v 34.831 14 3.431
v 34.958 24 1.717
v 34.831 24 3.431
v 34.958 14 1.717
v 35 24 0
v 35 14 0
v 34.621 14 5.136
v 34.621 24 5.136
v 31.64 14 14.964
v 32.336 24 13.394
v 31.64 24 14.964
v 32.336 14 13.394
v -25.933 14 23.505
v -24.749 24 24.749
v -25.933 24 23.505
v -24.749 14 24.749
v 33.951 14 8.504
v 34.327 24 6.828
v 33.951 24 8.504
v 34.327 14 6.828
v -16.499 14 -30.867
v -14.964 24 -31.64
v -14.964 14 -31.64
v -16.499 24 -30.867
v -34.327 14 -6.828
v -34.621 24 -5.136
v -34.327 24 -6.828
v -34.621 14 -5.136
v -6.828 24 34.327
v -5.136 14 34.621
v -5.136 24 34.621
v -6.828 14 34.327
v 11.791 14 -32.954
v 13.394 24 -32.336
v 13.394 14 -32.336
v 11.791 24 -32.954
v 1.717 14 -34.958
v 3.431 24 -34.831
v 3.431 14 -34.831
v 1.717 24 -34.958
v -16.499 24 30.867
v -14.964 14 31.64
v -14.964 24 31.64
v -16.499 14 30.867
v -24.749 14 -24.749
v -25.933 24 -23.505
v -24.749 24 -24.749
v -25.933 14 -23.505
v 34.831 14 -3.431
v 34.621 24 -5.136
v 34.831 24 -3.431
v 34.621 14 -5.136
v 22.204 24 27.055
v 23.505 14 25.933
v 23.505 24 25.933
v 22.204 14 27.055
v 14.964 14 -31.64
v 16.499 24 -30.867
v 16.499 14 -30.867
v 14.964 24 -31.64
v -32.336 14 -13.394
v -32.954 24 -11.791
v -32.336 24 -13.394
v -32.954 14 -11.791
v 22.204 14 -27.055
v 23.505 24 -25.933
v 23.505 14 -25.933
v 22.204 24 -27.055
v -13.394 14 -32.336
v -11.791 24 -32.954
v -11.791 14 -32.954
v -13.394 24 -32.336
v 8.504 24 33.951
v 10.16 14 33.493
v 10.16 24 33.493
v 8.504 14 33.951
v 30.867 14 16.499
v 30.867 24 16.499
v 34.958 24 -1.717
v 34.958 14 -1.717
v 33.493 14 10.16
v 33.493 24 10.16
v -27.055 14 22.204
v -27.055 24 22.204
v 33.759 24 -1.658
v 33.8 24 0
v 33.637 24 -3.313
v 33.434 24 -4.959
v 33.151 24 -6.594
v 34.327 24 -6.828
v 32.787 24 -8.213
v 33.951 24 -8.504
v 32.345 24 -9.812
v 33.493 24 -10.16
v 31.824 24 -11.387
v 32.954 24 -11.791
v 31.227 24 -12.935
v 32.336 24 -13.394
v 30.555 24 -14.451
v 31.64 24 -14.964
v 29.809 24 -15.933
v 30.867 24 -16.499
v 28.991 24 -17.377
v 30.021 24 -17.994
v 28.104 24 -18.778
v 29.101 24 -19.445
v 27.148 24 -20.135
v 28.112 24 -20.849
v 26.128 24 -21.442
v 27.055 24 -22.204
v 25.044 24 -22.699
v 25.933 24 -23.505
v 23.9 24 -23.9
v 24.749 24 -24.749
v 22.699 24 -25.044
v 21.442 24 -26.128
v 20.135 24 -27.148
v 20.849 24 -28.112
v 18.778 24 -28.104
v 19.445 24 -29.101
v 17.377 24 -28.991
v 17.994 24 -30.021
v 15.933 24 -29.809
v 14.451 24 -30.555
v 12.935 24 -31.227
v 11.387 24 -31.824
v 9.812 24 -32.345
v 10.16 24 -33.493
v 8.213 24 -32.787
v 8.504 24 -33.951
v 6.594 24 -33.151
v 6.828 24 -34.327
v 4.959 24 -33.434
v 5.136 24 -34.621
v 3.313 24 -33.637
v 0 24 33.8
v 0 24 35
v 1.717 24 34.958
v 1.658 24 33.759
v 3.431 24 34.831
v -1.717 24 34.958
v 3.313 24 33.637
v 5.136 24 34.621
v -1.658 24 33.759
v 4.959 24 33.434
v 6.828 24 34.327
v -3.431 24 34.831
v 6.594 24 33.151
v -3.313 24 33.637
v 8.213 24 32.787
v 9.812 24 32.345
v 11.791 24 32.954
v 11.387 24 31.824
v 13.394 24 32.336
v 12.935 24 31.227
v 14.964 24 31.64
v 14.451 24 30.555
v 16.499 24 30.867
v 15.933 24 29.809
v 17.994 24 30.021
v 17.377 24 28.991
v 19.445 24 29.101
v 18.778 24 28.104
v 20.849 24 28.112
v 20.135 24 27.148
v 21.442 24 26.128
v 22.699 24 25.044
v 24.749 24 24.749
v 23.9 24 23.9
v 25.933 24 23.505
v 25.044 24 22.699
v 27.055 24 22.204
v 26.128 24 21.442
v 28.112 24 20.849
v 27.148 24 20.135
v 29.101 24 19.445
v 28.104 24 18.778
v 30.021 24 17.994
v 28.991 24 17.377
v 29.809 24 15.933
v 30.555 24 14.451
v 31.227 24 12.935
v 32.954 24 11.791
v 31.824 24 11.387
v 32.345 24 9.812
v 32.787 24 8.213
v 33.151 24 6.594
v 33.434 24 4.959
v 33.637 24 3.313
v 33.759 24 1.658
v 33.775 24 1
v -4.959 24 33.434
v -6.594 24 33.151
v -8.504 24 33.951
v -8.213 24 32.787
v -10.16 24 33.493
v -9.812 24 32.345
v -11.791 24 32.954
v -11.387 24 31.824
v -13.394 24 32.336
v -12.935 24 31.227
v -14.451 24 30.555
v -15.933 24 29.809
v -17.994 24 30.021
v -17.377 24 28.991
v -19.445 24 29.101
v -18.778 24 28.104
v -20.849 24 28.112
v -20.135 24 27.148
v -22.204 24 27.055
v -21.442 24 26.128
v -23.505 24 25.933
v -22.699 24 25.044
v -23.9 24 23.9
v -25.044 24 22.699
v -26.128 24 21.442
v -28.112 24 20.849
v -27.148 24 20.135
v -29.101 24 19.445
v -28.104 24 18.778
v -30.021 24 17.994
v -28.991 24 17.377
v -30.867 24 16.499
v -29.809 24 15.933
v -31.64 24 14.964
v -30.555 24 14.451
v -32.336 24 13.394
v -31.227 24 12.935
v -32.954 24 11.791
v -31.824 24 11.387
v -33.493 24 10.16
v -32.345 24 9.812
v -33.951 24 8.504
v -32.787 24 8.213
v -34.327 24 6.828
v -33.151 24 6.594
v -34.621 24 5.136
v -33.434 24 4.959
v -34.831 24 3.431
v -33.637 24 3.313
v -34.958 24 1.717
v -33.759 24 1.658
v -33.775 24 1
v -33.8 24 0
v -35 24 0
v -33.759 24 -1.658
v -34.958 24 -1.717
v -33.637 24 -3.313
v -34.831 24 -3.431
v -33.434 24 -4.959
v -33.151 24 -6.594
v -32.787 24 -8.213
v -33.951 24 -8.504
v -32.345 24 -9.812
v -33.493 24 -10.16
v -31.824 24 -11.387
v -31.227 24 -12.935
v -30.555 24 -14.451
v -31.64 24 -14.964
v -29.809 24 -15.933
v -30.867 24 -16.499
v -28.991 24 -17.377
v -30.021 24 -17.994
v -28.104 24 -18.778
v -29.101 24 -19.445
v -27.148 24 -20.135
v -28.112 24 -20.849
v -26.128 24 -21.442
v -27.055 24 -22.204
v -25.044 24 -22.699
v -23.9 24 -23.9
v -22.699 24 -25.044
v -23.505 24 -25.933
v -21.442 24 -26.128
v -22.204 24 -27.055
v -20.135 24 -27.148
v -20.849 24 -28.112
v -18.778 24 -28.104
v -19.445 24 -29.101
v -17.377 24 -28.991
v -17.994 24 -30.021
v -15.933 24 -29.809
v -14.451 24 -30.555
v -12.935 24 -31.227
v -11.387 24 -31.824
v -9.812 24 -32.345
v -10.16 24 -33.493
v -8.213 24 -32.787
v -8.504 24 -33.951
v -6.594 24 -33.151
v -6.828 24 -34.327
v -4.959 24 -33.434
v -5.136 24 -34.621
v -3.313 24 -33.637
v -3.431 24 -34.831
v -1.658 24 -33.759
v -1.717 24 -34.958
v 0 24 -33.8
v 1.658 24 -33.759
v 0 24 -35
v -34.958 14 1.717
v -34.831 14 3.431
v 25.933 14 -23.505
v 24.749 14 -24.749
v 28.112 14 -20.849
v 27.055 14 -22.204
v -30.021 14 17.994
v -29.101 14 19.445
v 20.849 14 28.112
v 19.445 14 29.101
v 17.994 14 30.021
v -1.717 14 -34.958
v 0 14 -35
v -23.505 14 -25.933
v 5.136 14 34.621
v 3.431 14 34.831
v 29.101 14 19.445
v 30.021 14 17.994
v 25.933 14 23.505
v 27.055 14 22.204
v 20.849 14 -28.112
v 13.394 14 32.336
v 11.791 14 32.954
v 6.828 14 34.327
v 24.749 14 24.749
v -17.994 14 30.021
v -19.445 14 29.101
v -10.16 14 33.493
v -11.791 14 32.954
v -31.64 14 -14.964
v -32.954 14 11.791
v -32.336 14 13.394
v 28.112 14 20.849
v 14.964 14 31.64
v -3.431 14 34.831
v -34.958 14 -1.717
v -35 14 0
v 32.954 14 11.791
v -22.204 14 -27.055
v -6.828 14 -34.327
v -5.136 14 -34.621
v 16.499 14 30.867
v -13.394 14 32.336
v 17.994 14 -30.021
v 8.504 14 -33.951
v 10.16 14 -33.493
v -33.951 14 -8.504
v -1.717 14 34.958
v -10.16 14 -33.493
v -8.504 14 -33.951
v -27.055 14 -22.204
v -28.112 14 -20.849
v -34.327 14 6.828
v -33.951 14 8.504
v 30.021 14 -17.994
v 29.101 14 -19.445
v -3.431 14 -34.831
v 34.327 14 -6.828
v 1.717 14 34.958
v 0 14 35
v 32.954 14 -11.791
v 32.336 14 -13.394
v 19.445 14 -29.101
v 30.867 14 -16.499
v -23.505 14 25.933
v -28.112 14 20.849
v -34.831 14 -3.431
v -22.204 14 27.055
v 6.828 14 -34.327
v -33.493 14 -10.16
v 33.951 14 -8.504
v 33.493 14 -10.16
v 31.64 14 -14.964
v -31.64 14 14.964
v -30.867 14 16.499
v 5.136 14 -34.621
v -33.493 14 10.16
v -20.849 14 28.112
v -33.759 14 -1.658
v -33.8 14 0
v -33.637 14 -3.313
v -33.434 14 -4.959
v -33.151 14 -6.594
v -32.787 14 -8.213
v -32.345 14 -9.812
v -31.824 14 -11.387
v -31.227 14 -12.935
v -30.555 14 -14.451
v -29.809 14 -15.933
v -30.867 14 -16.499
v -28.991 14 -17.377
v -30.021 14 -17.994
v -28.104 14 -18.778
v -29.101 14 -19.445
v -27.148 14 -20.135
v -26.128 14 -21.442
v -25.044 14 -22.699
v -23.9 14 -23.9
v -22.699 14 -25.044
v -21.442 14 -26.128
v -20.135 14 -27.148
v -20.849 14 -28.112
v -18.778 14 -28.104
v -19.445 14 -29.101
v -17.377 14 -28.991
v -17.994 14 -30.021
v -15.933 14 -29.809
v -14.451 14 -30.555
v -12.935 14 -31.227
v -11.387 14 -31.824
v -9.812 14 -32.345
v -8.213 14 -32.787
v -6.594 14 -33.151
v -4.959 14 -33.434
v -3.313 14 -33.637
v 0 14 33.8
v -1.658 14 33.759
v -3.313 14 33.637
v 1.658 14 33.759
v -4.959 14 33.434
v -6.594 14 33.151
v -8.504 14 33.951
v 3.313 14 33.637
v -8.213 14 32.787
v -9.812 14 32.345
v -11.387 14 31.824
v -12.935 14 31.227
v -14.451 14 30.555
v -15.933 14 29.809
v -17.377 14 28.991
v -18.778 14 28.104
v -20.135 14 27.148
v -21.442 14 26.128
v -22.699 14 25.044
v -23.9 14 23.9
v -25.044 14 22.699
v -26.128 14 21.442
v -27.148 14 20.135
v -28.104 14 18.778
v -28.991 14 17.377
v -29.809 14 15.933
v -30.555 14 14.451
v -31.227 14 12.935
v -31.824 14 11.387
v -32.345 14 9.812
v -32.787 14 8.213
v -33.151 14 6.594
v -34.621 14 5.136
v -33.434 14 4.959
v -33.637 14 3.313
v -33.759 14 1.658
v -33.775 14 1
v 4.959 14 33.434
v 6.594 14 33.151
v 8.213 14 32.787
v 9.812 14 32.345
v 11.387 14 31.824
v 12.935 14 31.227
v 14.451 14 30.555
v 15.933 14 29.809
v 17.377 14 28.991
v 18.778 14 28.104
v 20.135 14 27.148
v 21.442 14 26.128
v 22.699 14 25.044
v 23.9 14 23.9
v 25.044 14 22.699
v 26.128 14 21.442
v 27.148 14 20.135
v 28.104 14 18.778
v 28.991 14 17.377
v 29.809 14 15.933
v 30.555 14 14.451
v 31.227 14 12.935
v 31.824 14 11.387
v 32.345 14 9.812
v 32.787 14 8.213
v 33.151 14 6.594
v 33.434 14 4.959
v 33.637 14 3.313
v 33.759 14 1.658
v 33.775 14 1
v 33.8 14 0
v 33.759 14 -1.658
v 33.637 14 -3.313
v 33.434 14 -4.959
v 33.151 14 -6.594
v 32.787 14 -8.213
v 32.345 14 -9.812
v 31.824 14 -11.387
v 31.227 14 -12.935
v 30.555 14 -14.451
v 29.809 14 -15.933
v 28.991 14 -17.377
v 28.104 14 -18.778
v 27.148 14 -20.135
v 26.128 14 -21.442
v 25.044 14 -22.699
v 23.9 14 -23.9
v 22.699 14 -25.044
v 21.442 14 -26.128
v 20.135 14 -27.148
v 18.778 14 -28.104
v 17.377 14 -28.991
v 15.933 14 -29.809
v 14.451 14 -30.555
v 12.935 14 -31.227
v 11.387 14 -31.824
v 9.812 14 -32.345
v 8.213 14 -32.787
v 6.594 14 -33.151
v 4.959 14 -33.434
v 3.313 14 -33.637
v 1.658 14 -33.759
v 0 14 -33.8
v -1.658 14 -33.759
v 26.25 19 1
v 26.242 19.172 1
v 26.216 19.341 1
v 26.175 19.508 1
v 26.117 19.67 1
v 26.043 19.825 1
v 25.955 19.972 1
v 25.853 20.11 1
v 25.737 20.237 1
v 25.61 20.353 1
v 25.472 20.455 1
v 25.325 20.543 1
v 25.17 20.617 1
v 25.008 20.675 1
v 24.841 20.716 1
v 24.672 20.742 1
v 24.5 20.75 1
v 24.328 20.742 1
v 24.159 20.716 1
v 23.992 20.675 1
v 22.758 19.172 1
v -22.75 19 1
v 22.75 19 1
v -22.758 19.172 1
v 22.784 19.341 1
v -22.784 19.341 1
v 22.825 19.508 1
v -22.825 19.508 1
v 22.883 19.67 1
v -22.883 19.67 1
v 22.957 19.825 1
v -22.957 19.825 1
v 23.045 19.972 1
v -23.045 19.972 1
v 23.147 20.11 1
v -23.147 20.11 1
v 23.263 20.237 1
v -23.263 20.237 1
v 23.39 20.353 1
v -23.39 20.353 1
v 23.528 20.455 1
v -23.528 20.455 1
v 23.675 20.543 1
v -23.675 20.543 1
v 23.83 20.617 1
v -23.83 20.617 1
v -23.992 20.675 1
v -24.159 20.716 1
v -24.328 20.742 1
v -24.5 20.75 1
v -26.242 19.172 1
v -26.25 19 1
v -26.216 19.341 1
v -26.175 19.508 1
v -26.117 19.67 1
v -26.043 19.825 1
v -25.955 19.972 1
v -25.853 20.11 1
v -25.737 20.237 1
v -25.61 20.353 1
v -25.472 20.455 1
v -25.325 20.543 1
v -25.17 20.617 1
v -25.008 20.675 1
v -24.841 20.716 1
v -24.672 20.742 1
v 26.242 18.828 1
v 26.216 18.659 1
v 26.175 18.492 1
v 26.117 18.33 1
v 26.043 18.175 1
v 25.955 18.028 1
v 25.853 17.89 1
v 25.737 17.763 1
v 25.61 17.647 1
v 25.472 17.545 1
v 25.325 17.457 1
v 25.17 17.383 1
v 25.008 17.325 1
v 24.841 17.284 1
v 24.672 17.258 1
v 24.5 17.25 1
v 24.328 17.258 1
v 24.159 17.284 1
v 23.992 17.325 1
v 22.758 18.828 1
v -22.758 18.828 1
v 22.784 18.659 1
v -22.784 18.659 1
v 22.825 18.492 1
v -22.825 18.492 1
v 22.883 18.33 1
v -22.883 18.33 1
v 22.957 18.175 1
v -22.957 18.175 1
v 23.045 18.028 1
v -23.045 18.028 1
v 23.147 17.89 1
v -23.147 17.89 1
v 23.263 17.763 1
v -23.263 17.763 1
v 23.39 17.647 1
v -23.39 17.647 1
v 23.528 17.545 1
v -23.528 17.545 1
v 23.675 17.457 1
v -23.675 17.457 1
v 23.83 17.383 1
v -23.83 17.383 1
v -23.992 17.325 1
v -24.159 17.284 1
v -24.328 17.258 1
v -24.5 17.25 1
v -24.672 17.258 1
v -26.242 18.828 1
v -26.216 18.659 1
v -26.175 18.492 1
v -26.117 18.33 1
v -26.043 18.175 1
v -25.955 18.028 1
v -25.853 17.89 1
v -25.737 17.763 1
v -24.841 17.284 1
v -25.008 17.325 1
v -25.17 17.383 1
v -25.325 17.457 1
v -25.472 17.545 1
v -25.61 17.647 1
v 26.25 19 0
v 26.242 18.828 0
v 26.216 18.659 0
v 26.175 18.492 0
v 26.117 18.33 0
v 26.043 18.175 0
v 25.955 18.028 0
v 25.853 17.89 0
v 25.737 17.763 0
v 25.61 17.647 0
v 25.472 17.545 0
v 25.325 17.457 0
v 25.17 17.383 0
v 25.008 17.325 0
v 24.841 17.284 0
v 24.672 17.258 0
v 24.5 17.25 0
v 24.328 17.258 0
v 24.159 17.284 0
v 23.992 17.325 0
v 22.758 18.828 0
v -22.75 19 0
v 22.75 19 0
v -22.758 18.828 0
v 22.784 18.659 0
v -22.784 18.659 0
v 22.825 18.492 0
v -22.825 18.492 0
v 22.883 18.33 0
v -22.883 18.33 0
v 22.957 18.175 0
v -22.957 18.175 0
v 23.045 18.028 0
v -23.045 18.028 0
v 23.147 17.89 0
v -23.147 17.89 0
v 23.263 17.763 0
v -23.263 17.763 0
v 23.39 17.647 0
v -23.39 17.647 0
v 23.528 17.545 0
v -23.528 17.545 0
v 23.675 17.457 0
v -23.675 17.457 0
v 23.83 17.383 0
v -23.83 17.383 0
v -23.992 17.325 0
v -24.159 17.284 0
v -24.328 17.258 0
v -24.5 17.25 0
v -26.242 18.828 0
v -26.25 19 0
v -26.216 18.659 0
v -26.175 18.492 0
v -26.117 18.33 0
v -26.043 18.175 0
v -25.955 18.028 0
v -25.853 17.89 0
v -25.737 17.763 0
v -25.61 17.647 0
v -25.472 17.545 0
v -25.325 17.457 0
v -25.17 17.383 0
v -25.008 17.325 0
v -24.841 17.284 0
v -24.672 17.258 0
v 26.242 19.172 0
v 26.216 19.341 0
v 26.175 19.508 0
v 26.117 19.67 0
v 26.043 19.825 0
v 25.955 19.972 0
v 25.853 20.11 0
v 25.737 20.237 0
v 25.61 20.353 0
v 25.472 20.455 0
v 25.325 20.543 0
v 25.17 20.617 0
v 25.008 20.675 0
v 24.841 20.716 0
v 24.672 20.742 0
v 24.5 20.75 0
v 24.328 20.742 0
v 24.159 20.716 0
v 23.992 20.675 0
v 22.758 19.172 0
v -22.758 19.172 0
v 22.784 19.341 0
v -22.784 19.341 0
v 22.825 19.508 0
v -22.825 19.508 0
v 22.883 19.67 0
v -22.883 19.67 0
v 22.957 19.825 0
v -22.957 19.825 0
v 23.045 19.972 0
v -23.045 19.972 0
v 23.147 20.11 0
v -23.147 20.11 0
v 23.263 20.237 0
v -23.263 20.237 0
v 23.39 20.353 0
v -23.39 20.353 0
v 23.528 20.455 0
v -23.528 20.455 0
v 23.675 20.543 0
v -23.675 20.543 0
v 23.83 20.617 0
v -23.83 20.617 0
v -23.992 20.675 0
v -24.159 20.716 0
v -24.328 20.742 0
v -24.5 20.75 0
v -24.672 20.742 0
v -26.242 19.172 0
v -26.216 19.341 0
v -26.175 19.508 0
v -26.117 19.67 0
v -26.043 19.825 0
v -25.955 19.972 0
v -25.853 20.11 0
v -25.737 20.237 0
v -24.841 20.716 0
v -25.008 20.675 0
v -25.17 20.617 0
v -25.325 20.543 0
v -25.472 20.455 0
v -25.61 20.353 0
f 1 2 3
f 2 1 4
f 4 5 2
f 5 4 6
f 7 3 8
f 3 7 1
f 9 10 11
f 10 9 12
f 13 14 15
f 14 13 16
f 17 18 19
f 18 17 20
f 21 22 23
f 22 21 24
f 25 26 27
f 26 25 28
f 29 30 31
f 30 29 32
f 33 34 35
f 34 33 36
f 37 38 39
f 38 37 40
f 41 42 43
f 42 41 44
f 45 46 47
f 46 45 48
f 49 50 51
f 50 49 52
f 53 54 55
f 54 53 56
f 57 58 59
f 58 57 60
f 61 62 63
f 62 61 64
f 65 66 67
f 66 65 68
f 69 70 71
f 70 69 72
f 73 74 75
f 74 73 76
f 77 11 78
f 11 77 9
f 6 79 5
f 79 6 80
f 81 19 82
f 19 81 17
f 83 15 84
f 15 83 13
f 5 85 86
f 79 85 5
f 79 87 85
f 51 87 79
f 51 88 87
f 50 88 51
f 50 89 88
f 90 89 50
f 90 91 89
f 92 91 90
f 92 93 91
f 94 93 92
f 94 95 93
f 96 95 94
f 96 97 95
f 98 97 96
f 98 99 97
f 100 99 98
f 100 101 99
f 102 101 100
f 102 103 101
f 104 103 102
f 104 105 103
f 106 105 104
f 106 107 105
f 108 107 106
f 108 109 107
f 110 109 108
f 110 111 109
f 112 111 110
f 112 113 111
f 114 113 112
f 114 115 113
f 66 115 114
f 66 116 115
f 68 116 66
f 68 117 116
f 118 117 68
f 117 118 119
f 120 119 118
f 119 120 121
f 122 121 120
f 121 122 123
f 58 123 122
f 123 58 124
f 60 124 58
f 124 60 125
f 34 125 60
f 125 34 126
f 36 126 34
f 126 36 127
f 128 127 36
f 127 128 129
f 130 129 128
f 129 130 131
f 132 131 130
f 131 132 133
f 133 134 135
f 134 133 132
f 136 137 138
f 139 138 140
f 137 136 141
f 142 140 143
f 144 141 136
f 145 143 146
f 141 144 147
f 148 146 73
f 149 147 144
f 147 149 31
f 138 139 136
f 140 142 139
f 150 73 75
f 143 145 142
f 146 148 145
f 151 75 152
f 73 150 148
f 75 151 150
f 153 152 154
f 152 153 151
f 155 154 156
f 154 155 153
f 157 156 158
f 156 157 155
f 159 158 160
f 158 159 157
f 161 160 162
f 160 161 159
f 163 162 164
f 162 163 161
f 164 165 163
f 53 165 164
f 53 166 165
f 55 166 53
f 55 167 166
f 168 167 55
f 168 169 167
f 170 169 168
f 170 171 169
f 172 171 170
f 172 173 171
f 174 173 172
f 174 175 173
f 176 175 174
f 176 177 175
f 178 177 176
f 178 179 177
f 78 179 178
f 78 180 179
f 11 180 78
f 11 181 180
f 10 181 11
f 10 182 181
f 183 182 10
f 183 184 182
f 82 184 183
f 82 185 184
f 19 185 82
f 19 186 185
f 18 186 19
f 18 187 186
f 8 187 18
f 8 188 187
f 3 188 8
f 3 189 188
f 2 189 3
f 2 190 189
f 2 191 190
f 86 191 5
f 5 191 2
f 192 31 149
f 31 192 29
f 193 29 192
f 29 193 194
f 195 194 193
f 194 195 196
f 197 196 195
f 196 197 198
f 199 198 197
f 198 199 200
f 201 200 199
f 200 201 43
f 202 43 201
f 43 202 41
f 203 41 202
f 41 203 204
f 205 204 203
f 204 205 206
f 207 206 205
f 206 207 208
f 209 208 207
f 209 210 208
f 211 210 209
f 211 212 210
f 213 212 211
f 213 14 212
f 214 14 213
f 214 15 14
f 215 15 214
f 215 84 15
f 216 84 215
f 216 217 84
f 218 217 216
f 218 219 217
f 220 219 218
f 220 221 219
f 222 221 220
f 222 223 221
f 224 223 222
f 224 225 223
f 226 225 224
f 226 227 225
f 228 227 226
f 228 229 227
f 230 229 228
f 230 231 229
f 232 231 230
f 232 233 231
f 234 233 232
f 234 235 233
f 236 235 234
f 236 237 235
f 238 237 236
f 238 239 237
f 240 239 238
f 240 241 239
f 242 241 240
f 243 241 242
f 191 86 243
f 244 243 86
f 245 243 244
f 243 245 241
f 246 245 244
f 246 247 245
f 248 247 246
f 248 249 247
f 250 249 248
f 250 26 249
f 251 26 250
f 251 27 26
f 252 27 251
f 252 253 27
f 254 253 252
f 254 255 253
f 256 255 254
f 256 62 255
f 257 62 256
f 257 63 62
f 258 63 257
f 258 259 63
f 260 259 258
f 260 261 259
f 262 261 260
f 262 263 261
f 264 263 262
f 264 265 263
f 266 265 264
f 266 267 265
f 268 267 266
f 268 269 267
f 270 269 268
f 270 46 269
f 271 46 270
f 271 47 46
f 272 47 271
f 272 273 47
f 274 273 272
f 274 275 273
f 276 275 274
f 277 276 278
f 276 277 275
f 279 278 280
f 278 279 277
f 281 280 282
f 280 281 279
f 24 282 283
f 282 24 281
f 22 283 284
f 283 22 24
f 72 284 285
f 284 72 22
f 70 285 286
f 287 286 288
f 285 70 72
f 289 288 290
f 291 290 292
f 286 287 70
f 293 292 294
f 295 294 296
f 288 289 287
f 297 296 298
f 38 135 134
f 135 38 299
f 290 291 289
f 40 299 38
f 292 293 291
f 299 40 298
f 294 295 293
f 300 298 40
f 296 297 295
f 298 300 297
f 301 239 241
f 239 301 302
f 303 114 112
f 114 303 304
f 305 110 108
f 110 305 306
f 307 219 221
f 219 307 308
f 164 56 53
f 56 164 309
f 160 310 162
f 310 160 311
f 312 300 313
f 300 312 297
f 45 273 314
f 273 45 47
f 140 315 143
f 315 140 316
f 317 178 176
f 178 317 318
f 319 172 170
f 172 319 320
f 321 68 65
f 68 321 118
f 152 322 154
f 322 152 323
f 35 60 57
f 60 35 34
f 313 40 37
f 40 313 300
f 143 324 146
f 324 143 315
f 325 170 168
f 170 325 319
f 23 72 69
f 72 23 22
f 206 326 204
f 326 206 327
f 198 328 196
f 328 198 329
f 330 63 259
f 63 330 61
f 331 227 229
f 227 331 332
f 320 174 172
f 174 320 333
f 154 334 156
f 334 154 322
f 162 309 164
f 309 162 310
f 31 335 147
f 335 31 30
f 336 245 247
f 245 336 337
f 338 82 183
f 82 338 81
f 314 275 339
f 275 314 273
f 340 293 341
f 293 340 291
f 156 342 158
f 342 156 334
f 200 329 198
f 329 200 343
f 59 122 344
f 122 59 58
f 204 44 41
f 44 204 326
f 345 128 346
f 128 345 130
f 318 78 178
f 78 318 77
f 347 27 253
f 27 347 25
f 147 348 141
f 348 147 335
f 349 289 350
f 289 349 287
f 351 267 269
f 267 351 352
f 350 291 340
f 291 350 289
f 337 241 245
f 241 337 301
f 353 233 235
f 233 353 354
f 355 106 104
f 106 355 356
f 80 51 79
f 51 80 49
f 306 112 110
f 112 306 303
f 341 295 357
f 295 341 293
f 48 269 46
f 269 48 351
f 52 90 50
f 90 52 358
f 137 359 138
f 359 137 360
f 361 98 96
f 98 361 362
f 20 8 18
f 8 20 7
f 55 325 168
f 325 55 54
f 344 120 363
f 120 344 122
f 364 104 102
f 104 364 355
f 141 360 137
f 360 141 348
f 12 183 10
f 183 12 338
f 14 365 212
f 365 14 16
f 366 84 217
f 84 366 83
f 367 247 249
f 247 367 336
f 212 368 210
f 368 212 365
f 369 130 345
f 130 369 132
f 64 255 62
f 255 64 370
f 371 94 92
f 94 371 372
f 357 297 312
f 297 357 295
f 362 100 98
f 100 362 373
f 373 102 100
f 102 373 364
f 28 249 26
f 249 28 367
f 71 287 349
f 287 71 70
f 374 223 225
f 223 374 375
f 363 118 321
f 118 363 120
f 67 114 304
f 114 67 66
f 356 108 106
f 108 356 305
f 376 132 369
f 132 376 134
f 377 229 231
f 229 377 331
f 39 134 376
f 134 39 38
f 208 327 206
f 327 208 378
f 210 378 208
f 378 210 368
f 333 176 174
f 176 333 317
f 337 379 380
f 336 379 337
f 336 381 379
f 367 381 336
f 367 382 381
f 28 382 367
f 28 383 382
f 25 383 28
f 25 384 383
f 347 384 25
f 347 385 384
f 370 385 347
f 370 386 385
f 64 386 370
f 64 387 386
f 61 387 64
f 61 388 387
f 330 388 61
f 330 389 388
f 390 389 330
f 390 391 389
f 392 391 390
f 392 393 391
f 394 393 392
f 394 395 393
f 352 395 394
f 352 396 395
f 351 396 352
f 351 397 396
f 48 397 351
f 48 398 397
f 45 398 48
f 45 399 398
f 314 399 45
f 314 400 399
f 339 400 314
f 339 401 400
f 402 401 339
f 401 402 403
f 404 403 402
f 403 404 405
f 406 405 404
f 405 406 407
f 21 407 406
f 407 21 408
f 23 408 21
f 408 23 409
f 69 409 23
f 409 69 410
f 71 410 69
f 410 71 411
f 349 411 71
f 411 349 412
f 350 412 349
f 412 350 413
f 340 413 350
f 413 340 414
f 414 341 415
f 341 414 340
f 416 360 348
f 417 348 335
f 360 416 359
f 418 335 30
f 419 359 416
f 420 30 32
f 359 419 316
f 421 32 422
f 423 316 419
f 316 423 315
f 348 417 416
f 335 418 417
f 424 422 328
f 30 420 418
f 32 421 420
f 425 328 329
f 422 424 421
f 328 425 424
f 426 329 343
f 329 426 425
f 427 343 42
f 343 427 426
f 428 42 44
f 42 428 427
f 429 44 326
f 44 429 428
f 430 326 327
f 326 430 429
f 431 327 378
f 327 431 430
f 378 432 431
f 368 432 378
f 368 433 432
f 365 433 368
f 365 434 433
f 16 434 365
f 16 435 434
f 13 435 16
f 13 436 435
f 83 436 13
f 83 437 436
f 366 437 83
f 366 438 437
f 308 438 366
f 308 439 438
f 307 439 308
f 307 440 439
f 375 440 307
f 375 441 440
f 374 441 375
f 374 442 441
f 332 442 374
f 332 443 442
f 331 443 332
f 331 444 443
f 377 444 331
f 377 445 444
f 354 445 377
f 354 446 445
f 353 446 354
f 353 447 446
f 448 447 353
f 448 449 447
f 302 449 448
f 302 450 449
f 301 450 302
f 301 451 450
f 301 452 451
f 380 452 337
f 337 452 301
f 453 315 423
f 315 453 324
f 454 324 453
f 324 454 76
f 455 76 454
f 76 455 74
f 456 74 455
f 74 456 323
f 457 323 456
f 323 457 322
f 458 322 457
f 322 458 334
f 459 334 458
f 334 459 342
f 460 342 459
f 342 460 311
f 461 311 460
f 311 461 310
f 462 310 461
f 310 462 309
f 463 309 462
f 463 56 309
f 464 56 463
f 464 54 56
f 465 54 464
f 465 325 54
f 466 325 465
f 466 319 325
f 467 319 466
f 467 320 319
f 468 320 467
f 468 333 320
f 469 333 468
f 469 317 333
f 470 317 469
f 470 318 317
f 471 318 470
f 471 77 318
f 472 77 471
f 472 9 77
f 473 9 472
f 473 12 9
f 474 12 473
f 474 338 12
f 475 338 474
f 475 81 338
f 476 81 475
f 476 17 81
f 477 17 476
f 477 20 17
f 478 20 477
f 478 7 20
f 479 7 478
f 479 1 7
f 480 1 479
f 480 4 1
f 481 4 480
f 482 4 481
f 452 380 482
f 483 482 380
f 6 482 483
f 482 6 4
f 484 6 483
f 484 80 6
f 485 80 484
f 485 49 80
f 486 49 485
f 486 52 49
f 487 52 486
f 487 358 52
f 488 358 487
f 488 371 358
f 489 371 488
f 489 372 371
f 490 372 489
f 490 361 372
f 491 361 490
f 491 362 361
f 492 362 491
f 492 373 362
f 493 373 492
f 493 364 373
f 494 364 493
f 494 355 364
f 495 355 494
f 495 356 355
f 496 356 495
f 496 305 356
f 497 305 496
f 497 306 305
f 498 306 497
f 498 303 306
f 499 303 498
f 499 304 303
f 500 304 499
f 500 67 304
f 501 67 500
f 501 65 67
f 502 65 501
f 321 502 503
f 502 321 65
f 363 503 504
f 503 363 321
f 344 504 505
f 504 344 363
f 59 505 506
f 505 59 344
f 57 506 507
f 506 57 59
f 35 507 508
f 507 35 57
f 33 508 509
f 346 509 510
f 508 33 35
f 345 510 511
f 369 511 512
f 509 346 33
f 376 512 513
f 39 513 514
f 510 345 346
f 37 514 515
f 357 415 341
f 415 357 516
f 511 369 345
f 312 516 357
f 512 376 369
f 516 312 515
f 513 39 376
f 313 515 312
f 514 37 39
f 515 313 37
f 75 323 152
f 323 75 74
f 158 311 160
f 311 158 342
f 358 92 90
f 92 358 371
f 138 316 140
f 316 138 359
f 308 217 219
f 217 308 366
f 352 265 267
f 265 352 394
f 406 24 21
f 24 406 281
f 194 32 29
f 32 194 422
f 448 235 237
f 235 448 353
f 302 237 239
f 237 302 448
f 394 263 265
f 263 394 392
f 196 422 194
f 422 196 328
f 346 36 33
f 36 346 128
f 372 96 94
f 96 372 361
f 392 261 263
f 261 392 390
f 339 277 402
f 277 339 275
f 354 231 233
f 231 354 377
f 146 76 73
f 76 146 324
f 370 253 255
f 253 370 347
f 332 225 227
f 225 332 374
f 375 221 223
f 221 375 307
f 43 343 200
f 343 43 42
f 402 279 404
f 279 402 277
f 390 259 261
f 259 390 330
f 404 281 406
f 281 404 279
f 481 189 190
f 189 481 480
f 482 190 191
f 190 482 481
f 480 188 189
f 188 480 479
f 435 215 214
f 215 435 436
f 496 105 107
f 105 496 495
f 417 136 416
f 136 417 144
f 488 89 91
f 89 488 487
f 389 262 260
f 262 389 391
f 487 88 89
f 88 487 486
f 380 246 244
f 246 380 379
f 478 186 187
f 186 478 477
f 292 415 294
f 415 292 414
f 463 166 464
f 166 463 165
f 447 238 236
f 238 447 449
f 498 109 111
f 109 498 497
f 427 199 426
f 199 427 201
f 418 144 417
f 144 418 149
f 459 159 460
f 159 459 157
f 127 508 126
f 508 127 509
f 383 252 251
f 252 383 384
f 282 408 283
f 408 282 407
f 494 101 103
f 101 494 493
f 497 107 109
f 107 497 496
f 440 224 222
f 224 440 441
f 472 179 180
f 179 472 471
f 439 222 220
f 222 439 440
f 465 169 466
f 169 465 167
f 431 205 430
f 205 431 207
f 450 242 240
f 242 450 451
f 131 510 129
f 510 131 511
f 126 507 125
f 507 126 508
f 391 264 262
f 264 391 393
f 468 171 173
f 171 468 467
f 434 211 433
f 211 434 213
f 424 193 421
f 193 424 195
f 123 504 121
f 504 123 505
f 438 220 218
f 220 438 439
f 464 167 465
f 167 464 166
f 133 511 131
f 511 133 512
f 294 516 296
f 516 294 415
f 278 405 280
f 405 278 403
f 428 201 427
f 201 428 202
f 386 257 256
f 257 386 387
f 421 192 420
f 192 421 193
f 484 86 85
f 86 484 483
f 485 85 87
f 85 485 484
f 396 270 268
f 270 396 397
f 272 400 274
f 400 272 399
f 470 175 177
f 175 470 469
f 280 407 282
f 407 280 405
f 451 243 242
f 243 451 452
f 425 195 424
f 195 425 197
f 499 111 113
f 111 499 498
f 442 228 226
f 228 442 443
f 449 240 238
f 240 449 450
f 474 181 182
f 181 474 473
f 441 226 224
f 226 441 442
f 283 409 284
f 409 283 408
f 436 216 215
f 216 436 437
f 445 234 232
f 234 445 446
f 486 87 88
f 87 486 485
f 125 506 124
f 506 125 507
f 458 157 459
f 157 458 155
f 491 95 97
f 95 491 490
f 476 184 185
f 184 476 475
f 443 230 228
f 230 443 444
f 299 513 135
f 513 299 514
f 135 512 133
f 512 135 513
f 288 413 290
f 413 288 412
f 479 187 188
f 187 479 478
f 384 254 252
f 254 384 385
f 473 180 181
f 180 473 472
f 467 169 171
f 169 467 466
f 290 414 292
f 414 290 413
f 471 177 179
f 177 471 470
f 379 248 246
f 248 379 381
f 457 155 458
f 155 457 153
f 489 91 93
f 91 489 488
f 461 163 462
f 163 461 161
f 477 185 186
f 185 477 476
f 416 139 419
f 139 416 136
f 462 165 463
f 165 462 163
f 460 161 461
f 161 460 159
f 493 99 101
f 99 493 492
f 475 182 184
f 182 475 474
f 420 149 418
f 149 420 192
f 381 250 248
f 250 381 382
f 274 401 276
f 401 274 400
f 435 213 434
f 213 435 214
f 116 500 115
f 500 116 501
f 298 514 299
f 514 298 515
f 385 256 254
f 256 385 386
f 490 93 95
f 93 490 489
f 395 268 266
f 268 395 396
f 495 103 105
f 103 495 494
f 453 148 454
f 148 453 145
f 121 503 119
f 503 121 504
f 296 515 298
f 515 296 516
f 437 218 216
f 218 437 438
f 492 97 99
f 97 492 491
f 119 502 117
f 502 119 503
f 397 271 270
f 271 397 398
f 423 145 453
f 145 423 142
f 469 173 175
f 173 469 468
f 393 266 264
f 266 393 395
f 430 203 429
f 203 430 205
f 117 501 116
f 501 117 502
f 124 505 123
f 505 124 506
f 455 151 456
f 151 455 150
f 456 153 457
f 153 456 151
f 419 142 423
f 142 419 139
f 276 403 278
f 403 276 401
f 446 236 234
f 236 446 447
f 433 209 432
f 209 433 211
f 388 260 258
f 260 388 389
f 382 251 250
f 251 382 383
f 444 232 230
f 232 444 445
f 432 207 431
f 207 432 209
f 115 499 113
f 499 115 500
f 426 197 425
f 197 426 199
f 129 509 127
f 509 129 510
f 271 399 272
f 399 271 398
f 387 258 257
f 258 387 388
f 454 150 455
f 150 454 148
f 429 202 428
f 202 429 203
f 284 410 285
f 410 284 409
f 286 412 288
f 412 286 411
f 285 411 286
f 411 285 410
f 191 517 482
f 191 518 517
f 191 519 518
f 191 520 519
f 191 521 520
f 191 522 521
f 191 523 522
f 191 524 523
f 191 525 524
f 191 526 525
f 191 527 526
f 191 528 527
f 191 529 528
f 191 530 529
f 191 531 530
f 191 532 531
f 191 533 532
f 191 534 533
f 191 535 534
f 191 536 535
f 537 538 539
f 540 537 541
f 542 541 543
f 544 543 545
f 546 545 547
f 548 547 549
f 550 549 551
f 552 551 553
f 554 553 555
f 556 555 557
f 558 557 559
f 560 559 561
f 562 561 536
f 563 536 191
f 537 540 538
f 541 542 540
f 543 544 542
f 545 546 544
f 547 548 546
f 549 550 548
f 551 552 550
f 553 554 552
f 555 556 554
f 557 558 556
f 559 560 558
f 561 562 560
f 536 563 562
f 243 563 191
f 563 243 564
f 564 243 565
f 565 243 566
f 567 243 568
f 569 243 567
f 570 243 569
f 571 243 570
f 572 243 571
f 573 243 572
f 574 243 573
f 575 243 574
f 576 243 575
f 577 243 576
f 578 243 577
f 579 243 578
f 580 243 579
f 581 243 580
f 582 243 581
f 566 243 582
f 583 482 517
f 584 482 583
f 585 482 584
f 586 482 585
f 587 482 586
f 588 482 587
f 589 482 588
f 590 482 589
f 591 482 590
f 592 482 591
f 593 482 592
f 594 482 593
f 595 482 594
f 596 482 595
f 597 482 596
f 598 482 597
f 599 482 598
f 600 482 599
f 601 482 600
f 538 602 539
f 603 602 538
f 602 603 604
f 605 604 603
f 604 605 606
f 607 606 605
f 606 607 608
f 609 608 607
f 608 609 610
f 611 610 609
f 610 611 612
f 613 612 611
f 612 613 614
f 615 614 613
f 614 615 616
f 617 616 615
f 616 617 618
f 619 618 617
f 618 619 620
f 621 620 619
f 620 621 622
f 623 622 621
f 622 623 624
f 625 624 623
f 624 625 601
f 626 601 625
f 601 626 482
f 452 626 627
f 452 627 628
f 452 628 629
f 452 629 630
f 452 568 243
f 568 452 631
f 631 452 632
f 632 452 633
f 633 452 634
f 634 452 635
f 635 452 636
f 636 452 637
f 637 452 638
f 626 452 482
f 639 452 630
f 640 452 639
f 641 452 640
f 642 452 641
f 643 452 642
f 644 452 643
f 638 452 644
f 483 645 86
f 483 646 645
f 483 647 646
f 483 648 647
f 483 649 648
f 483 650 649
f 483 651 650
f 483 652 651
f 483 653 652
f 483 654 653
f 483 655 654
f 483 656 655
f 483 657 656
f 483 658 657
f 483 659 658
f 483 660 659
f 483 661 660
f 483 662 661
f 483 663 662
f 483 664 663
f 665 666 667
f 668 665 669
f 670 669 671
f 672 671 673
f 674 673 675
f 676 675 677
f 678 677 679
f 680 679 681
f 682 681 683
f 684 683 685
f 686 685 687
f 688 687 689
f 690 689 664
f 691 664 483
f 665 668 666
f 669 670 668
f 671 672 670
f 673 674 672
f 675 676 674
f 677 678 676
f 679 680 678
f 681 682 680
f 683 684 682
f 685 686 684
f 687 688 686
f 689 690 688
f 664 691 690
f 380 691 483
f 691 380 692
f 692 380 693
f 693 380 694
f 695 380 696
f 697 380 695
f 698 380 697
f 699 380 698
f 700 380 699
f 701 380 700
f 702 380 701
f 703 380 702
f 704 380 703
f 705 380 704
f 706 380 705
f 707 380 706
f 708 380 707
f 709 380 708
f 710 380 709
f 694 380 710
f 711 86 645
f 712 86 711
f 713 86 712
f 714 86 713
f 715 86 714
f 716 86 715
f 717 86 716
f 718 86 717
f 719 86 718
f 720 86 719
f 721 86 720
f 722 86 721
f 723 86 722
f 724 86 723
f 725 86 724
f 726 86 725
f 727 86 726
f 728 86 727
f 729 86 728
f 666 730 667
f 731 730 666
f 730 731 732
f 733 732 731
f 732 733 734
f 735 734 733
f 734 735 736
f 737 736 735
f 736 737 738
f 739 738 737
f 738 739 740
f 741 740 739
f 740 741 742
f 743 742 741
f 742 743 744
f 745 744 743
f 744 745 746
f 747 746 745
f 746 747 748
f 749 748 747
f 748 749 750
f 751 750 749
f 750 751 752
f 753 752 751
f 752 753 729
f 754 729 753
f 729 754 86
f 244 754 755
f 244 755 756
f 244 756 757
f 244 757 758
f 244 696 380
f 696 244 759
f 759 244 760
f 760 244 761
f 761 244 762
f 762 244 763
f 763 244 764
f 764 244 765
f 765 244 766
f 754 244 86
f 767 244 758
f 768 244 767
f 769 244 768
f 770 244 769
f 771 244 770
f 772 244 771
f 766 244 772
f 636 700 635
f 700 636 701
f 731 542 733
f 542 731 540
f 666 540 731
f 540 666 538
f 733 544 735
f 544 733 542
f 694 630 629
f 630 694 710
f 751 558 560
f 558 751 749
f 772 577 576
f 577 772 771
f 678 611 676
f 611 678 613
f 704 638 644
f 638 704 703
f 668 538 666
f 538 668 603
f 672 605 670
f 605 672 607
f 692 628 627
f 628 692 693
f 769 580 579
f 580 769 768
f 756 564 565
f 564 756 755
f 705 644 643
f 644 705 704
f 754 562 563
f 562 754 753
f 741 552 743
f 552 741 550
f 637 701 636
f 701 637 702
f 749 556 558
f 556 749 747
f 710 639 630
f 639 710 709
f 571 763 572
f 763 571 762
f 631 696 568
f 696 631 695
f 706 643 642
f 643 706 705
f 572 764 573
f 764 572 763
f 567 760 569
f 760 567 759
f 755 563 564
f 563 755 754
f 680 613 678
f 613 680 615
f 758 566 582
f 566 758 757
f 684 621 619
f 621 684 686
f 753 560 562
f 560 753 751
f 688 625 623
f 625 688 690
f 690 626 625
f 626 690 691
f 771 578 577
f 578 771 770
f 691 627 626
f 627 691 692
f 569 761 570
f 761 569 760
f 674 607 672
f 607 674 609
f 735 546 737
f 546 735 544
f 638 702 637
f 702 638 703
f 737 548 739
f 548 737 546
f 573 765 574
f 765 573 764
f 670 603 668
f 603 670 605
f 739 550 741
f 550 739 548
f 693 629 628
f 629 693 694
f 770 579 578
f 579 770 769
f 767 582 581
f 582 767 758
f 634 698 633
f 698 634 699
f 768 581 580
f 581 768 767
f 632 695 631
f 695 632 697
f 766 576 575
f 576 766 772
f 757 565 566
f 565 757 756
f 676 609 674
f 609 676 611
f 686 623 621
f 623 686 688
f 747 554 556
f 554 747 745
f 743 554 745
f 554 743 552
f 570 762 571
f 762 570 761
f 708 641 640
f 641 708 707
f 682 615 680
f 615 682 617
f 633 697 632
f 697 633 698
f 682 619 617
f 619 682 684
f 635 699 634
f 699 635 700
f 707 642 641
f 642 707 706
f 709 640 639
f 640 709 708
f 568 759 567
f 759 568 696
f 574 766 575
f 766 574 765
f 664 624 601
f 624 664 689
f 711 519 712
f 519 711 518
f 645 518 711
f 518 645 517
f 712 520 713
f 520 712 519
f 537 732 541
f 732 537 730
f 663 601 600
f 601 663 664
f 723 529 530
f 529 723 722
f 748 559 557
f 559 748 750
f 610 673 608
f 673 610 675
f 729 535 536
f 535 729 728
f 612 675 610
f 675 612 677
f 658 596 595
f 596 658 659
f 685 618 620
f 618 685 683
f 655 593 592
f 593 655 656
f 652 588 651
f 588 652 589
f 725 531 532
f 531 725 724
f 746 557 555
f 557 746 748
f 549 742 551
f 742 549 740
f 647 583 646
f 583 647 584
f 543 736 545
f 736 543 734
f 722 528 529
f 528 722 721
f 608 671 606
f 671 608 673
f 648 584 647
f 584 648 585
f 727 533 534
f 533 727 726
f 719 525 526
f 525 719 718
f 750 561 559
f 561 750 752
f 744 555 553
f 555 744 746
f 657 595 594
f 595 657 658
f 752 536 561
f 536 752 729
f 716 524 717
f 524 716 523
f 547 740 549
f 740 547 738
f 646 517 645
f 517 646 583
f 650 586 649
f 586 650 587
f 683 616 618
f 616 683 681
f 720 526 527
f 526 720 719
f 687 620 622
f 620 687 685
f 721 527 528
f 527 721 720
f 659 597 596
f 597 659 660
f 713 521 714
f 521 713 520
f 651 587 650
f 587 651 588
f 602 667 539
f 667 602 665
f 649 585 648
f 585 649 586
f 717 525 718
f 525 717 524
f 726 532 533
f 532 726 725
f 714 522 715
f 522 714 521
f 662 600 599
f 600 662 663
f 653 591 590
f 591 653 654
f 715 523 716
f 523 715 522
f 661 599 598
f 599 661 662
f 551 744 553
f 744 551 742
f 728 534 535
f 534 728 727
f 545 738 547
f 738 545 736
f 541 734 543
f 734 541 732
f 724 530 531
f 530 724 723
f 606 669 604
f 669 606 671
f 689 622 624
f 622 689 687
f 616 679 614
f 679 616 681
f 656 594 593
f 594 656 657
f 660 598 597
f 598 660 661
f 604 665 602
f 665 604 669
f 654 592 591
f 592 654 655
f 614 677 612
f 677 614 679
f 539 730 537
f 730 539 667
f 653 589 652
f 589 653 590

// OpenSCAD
diam=70;
thk=10;
wth=1.2;

presc=0.8;

module ring() {
rotate([90,0,0])
    difference() {
        cylinder(d=diam, h=thk, $fn=128, center=true);
        cylinder(d=diam-wth*2, h=thk+1, $fn=128, center=true);
    }
}



difference() {
    union() {
//        translate([0,0,0.5])
//            cube([57,86,1], center=true);
/*        
        translate([-24.5,19,0]) {
            cylinder(d=8.0, h=3.0, $fn=64);
        }
        translate([24.5,19,0]) {
            cylinder(d=8.0, h=3.0, $fn=64);
        }
        translate([-24.5,-39,0]) {
            cylinder(d=8.0, h=3.0, $fn=64);
        }
        translate([24.5,-39,0]) {
            cylinder(d=8.0, h=3.0, $fn=64);
        }
*/
        translate([0,19,0]) {
            translate([0,0,0.5])
                cube([diam-wth,10,1], center=true);
            ring();
        }
/*
        translate([0,-39,0]) {
            translate([0,0,0.5])
                cube([diam-wth,10,1], center=true);
            ring();
        }
*/
    }

    union() {
        translate([-24.5,19,0]) {
            cylinder(d=3.5, h=10, $fn=64);
//            cylinder(d=6.0, h=2.0, $fn=6);
        }
        translate([24.5,19,0]) {
            cylinder(d=3.5, h=10, $fn=64);
//            cylinder(d=6.0, h=2.0, $fn=6);
        }
        translate([-24.5,-39,0]) {
            cylinder(d=3.5, h=10, $fn=64);
//            cylinder(d=6.0, h=2.0, $fn=6);
        }
        translate([24.5,-39,0]) {
            cylinder(d=3.5, h=10, $fn=64);
//            cylinder(d=6.0, h=2.0, $fn=6);
        }
    }

}
